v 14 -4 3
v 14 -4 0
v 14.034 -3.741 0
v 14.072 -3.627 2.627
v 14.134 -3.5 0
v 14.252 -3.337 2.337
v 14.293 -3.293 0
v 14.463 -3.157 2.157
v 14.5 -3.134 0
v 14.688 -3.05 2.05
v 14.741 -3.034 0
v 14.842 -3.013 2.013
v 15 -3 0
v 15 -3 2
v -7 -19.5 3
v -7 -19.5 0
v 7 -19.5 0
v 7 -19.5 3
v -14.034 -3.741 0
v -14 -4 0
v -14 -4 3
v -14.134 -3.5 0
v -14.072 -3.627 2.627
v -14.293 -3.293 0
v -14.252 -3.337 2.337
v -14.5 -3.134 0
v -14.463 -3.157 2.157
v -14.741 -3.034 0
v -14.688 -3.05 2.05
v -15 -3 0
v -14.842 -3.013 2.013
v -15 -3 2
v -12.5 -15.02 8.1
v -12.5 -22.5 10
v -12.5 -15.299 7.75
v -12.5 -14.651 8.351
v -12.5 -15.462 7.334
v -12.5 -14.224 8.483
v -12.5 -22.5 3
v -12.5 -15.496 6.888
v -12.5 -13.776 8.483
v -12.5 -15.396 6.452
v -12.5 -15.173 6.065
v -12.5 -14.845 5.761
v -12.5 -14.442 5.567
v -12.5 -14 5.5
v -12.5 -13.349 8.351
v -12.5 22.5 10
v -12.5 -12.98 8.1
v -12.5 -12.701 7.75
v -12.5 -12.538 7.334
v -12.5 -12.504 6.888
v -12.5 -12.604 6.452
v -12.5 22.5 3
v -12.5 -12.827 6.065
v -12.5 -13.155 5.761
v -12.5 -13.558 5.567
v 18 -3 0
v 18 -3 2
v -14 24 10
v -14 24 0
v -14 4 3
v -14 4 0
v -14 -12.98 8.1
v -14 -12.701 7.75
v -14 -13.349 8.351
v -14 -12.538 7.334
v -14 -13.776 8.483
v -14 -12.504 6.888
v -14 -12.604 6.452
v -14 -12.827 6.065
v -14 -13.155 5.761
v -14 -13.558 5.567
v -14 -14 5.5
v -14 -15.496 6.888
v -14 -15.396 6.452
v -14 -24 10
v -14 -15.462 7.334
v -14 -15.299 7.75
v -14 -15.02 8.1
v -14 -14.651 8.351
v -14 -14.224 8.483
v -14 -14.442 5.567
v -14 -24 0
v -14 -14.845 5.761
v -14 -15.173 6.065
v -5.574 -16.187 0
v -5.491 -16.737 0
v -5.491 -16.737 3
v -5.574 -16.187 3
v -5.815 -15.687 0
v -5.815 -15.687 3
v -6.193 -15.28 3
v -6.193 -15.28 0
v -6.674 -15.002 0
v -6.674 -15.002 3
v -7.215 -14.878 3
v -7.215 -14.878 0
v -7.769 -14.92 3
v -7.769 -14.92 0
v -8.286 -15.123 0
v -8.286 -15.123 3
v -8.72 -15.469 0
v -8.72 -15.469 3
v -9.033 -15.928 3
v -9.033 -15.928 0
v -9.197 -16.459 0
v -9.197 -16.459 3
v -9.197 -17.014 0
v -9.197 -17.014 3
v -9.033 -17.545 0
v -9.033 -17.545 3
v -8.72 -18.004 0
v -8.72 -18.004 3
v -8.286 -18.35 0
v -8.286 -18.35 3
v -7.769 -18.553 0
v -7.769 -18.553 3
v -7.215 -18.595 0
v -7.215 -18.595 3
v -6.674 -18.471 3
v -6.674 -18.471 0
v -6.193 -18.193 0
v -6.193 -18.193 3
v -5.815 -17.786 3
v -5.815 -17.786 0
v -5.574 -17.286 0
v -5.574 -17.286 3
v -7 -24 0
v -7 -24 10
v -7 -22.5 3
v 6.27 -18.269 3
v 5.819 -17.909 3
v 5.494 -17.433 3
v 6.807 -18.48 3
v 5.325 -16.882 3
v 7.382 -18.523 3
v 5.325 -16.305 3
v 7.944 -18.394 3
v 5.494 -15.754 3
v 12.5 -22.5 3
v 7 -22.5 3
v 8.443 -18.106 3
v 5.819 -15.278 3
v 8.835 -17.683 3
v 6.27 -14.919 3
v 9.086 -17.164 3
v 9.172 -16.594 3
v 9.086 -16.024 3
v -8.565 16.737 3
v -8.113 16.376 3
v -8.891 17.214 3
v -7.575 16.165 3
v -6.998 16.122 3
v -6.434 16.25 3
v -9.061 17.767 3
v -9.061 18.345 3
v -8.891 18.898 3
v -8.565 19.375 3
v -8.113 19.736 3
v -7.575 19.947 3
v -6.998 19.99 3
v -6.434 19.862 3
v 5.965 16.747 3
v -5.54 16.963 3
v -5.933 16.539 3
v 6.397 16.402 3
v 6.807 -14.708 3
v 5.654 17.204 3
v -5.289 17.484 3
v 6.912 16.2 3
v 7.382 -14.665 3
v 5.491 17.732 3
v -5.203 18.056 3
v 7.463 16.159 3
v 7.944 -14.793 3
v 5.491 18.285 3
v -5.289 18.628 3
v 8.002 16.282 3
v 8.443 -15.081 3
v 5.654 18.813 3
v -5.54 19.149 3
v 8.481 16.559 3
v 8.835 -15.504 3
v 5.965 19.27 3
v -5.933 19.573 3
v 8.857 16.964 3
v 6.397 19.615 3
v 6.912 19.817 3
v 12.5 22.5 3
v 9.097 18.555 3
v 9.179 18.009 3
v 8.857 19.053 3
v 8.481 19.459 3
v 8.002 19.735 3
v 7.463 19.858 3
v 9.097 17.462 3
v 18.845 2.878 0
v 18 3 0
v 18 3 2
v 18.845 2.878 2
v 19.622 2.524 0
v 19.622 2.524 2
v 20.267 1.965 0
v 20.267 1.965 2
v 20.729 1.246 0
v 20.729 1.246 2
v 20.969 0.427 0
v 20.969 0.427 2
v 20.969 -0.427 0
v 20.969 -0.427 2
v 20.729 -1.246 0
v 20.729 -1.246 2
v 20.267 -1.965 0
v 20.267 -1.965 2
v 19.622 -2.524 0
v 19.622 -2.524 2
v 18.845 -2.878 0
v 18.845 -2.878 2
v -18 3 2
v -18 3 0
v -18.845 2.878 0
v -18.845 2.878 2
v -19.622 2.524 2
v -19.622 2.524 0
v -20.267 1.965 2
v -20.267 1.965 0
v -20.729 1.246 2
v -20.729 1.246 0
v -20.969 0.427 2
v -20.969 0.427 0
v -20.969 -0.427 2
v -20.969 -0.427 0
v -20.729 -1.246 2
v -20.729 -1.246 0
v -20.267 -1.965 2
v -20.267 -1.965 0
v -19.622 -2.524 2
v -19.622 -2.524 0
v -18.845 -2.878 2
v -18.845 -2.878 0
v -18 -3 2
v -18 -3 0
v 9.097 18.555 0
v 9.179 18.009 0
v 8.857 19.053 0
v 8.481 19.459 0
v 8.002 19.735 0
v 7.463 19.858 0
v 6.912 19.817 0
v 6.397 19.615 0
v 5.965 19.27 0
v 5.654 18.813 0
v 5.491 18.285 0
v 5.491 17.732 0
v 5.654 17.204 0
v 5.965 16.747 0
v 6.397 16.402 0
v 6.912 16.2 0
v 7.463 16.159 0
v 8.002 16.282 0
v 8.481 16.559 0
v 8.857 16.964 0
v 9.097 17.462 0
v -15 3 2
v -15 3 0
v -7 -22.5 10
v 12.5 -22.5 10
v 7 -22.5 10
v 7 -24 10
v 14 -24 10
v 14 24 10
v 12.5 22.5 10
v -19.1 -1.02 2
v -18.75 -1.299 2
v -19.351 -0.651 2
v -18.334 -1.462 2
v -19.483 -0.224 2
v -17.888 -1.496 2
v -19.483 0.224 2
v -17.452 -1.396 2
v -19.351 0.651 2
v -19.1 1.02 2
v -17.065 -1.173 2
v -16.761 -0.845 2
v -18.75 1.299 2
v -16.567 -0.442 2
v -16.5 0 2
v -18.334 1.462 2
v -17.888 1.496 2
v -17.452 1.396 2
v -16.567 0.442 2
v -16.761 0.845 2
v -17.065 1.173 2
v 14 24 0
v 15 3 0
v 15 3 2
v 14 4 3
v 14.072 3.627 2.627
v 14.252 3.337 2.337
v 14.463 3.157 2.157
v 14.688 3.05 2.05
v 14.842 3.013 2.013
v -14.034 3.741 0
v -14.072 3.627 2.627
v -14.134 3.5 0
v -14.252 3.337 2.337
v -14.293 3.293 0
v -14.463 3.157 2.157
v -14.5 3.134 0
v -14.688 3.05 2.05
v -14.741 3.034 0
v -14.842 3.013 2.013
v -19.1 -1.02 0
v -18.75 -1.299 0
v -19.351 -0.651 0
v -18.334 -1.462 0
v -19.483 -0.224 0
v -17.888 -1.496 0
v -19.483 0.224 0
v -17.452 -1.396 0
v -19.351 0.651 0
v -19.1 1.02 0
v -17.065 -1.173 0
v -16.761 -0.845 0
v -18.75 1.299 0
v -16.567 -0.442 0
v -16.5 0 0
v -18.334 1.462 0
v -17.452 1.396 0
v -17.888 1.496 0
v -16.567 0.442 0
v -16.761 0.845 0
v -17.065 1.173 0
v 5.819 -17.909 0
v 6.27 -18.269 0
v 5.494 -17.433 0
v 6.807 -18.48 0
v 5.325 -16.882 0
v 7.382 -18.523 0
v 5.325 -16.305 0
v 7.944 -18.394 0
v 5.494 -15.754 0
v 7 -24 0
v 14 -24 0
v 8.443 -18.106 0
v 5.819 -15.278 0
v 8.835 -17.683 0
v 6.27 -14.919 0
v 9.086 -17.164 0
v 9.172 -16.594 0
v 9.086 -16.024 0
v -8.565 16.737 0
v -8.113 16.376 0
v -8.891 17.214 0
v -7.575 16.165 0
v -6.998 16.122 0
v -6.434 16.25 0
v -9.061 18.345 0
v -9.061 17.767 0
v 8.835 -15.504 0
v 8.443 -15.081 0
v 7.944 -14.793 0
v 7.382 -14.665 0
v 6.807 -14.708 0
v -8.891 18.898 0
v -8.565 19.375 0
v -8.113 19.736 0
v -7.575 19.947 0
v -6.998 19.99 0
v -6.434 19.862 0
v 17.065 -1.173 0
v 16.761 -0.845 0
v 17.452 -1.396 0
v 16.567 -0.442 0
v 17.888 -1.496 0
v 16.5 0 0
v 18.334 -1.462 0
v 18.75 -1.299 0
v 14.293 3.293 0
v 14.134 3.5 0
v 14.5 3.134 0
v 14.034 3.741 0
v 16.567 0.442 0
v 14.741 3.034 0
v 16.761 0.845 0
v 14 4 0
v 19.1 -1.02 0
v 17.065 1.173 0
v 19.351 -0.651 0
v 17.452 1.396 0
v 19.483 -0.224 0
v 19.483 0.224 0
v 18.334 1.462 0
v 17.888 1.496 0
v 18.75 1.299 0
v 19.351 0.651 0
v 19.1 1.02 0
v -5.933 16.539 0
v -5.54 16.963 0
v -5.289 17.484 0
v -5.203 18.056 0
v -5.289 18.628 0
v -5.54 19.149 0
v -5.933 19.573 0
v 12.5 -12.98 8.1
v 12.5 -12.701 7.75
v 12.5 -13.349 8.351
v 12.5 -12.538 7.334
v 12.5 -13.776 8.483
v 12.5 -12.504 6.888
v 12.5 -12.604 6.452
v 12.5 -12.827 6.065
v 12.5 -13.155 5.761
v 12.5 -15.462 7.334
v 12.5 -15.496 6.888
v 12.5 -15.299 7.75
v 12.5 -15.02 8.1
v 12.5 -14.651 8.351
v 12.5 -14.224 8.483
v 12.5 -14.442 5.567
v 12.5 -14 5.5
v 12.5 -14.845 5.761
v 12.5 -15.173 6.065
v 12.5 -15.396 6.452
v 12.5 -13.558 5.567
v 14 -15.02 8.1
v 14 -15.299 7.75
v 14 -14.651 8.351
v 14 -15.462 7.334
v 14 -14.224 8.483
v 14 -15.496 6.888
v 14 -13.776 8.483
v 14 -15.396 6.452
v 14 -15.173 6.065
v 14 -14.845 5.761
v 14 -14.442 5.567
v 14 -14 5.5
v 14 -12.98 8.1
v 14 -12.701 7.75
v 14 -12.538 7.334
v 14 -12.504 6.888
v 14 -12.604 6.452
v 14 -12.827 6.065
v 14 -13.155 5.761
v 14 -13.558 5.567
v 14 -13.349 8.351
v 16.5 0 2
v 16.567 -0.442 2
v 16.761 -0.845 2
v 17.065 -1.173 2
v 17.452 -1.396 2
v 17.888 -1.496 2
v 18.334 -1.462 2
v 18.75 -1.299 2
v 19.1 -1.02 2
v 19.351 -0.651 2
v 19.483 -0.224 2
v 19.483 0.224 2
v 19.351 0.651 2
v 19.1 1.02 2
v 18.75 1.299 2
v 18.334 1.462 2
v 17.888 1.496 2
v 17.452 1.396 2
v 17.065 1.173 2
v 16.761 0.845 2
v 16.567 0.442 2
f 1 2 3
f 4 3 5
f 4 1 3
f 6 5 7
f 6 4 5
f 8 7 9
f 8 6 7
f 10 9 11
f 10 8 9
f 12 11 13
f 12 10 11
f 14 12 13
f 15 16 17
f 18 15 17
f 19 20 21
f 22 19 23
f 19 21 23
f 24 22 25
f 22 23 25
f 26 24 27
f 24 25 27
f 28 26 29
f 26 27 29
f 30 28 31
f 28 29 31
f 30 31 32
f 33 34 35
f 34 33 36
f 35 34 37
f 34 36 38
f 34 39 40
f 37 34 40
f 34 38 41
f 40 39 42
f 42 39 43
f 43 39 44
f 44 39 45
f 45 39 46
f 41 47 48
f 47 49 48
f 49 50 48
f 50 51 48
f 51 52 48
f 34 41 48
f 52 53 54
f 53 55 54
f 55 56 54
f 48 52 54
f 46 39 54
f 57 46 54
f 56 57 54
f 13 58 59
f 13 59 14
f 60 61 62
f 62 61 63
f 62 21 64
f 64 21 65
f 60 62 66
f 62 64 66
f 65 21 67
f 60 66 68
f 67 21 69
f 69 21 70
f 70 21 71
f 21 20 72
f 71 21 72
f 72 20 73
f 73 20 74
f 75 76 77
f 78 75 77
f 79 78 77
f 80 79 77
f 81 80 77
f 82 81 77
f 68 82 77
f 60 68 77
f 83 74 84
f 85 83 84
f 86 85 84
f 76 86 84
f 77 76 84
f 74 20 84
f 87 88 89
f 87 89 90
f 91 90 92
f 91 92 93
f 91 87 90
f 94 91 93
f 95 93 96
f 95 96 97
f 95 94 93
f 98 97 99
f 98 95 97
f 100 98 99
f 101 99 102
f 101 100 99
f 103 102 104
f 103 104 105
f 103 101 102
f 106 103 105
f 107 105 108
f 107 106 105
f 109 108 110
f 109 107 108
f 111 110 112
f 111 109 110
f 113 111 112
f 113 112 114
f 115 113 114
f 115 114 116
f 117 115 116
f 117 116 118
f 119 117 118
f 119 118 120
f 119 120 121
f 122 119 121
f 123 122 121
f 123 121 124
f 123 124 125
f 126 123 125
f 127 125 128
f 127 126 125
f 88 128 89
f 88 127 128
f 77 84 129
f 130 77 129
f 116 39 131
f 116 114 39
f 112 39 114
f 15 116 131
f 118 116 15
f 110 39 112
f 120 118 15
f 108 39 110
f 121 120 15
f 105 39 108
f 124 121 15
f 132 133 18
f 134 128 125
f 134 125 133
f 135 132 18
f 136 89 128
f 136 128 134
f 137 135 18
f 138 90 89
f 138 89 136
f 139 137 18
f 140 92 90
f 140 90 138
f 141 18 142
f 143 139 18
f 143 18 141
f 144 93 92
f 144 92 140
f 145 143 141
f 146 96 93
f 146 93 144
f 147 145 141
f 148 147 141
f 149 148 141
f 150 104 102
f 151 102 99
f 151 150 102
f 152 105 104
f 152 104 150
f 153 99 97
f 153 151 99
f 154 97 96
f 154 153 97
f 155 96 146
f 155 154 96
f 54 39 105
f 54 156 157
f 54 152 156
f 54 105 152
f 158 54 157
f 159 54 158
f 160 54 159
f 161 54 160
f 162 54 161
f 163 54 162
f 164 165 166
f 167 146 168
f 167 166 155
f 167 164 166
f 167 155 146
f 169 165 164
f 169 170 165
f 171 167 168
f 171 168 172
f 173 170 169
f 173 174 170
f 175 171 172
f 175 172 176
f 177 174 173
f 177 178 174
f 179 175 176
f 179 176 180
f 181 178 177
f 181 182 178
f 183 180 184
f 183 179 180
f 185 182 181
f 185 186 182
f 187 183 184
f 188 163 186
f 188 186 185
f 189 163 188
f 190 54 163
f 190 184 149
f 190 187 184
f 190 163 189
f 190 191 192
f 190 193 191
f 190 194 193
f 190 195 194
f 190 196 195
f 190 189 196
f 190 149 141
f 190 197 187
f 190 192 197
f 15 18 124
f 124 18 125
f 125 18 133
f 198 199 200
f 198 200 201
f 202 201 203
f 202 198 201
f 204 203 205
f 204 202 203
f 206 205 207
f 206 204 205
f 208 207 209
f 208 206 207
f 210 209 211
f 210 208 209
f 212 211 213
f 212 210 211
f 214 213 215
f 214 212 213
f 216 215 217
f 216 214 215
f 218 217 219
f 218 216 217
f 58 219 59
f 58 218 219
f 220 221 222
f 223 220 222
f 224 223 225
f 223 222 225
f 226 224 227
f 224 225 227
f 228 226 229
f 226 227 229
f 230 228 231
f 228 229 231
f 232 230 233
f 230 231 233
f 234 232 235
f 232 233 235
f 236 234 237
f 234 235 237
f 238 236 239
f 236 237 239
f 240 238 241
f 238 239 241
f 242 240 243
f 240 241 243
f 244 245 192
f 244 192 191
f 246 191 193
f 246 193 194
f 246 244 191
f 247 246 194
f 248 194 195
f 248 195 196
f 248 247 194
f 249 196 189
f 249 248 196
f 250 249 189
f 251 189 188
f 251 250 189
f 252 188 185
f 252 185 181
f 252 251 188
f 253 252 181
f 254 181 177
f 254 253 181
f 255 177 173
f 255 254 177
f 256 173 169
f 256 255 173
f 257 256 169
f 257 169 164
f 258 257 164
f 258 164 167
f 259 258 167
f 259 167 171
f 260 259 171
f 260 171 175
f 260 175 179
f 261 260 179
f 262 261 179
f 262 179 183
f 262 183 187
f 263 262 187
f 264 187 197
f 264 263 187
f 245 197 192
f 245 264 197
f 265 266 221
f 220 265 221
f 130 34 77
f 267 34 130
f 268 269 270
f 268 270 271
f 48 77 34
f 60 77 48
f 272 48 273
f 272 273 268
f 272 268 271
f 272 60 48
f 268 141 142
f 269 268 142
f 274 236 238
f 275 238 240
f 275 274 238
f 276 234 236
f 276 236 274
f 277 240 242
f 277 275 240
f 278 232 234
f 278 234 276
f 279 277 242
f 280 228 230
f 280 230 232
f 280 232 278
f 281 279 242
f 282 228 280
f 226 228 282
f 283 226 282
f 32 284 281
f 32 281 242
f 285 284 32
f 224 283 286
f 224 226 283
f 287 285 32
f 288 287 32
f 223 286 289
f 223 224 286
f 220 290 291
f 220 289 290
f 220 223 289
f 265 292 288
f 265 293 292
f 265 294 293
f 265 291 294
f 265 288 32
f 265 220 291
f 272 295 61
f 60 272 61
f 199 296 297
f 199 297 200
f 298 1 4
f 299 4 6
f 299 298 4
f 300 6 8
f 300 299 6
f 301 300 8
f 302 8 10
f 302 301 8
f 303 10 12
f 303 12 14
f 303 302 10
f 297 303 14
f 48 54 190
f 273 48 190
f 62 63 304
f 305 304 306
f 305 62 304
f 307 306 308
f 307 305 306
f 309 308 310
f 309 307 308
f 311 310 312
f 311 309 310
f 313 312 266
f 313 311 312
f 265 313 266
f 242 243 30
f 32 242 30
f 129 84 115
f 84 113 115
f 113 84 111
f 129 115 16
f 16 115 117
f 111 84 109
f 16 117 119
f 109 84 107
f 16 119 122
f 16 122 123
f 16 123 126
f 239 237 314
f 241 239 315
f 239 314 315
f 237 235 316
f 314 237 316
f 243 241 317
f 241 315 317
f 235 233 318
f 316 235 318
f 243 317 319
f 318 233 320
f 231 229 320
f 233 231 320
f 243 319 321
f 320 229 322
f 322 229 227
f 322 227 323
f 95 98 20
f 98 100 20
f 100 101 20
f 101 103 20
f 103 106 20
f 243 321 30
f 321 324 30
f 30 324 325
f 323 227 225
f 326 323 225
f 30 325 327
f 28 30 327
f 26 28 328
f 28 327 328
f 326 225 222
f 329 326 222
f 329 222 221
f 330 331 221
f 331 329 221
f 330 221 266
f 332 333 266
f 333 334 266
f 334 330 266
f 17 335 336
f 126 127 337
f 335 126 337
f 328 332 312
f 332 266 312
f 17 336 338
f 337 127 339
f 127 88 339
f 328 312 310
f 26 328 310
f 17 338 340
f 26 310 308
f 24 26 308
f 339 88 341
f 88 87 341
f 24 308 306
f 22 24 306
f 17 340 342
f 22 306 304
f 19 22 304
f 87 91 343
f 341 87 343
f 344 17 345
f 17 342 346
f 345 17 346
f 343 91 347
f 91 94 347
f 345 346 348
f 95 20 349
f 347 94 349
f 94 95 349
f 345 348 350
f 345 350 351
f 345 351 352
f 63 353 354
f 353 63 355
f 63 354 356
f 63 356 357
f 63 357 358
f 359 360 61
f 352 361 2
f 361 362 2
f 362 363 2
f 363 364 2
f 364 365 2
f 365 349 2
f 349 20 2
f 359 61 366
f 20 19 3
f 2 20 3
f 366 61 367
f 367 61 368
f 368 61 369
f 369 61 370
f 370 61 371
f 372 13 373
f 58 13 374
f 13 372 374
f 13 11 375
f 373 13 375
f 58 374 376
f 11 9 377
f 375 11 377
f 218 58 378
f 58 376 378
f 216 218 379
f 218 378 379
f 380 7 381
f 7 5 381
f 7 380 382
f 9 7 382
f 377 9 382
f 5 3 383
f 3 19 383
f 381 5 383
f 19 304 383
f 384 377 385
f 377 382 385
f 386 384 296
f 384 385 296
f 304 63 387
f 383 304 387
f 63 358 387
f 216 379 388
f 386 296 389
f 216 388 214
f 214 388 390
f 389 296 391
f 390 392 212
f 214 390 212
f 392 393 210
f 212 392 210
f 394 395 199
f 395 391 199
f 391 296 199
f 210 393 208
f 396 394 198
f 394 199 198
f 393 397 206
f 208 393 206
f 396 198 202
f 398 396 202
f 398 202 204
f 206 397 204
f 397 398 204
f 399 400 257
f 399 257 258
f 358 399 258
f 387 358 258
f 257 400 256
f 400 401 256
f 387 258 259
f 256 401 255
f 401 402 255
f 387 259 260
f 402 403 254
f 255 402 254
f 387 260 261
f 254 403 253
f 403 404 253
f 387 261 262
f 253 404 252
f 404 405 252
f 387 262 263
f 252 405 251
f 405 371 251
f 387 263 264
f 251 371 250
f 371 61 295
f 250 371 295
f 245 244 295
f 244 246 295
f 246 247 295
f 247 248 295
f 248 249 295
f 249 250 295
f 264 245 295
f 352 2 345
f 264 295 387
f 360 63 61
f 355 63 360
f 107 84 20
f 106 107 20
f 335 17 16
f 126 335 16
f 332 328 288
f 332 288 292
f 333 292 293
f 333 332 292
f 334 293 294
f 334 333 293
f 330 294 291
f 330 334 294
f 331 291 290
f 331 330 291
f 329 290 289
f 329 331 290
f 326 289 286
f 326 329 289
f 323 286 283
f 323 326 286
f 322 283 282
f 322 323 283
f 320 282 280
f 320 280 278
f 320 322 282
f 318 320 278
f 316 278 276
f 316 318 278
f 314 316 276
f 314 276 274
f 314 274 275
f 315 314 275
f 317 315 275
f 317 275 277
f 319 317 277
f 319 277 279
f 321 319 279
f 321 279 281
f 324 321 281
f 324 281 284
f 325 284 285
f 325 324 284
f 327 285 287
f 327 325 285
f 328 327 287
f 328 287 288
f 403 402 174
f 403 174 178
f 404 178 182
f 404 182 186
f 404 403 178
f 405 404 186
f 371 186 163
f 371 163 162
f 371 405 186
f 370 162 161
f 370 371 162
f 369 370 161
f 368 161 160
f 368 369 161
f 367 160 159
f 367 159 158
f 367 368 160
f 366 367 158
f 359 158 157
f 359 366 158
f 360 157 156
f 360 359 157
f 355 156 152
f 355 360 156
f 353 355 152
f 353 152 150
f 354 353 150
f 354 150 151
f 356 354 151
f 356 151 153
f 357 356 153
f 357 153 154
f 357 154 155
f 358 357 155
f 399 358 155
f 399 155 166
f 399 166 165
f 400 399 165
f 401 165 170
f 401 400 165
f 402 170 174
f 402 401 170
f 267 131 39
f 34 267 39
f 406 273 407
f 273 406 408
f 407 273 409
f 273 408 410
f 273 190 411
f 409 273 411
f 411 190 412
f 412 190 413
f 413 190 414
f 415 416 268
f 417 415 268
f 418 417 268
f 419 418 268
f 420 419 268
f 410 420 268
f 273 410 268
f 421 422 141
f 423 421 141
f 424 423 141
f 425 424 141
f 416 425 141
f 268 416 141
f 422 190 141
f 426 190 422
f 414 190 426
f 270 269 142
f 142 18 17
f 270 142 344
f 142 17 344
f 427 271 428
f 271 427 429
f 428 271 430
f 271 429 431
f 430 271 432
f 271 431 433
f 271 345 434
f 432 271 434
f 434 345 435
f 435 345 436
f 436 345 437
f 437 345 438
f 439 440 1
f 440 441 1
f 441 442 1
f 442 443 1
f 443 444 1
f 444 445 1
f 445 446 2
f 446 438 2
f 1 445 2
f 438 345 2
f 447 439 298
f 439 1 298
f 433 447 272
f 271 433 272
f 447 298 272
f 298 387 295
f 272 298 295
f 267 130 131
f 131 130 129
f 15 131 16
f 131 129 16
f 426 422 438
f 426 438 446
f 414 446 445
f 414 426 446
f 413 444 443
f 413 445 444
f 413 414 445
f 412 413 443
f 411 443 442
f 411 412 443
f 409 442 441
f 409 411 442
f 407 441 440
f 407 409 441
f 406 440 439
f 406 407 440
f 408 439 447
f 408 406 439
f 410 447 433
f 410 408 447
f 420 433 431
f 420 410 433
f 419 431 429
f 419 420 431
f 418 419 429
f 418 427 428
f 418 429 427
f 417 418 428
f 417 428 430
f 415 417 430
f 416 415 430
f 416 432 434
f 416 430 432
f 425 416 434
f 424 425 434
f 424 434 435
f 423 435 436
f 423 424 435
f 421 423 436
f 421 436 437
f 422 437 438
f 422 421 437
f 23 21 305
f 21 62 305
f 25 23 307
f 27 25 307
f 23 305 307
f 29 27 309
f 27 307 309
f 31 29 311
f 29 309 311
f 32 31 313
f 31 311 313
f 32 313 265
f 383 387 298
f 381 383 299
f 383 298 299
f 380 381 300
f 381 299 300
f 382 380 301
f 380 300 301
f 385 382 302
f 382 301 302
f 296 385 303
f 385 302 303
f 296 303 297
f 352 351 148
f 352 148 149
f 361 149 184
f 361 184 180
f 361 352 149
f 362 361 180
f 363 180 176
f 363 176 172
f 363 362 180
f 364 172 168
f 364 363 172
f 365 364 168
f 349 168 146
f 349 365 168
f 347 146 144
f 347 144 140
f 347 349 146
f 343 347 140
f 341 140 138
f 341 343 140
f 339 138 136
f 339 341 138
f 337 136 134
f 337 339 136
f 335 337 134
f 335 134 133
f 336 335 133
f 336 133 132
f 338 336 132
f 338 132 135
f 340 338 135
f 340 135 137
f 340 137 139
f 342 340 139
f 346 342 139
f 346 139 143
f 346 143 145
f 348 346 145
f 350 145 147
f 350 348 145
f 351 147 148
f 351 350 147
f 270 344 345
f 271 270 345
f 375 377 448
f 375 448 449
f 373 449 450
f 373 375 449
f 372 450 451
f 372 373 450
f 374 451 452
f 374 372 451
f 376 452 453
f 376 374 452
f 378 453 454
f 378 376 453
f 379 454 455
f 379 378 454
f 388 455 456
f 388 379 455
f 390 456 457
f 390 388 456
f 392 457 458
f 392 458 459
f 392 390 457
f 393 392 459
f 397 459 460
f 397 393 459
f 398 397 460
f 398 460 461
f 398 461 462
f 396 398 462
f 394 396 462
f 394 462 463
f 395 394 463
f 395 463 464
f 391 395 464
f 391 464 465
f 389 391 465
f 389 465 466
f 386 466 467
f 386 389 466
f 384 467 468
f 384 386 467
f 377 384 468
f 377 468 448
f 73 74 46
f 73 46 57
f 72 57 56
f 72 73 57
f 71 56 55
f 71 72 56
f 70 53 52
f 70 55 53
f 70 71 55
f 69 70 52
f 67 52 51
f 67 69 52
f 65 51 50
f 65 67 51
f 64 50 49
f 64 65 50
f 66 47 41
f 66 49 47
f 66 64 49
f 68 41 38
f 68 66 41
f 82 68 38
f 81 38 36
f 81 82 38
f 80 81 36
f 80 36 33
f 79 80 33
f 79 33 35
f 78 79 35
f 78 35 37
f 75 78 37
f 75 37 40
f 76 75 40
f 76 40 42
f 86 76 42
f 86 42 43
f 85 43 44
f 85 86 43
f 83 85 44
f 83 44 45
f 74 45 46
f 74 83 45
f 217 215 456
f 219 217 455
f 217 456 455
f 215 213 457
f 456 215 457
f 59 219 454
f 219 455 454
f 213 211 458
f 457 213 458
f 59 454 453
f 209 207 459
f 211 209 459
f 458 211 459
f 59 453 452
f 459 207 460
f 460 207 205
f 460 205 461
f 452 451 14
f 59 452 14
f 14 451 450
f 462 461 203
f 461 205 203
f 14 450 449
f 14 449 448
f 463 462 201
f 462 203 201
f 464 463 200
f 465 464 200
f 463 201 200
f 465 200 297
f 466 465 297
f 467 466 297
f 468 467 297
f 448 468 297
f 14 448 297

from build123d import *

# Parameters (mm, degrees)
ESQUISSE1_W                  = 25
ESQUISSE1_H                  = 45
ESQUISSE1_R                  = 1.863501178
ESQUISSE1_R_2                = 1.93430269
ESQUISSE1_R_3                = 1.939737899
ESQUISSE1_R_4                = 1.854627201
BOSS_EXTRU_1_DEPTH           = 3
BOSS_EXTRU_2_DEPTH           = 10
ENL_V_MAT_EXTRU_1_DEPTH      = 30.52964612
ENL_V_MAT_EXTRU_1_DEPTH_BACK = 30.52964612
ESQUISSE3_R                  = 1.5
ESQUISSE4_R                  = 1.5
BOSS_EXTRU_3_DEPTH           = 2
CONG_1_R                     = 1
ESQUISSE5_W                  = 14
ESQUISSE5_H                  = 3
ENL_V_MAT_EXTRU_2_DEPTH      = 34.421549934


with BuildPart() as part:
    # Esquisse1 → Boss.-Extru.1 (new body)
    with BuildSketch(Plane.XY):
        Rectangle(ESQUISSE1_W, ESQUISSE1_H)
        with Locations((-7.354431697, -16.736502833)):
            Circle(ESQUISSE1_R, mode=Mode.SUBTRACT)
        with Locations((7.237211302, -16.593743463)):
            Circle(ESQUISSE1_R_2, mode=Mode.SUBTRACT)
        with Locations((-7.142905367, 18.055953642)):
            Circle(ESQUISSE1_R_3, mode=Mode.SUBTRACT)
        with Locations((7.324743745, 18.008545284)):
            Circle(ESQUISSE1_R_4, mode=Mode.SUBTRACT)
    extrude(amount=BOSS_EXTRU_1_DEPTH)

    # Esquisse2 → Boss.-Extru.2 (add)
    with BuildSketch(Plane.XY):
        Polygon((7, -22.5), (7, -24), (14, -24), (14, 24), (-14, 24), (-14, -24), (-7, -24), (-7, -22.5), (-12.5, -22.5), (-12.5, 22.5), (12.5, 22.5), (12.5, -22.5), align=None)
    extrude(amount=BOSS_EXTRU_2_DEPTH)

    # Esquisse3 → Enlèv. mat.-Extru.1 (cut, two sides: drawn at the far end of the back side and taken through both)
    with BuildSketch(Plane(origin=(0, 0, 0), x_dir=(0, 0, -1), z_dir=(1, 0, 0)).offset(-ENL_V_MAT_EXTRU_1_DEPTH_BACK)):
        with Locations((-7, -14)):
            Circle(ESQUISSE3_R)
    extrude(amount=ENL_V_MAT_EXTRU_1_DEPTH + ENL_V_MAT_EXTRU_1_DEPTH_BACK, mode=Mode.SUBTRACT)

    # Esquisse4 → Boss.-Extru.3 (add)
    # profile 1 of 2: a face of its own
    with BuildSketch(Plane.XY):
        with BuildLine():
            Line((-14, 3), (-18, 3))
            ThreePointArc((-18, 3), (-21, 0), (-18, -3))
            Line((-18, -3), (-14, -3))
            Line((-14, -3), (-14, 3))
        make_face()
        with Locations((-18, 0)):
            Circle(ESQUISSE4_R, mode=Mode.SUBTRACT)
    # profile 2 of 2: a face of its own
    with BuildSketch(Plane.XY):
        with BuildLine():
            Line((18, -3), (14, -3))
            Line((14, -3), (14, 3))
            Line((14, 3), (18, 3))
            ThreePointArc((18, 3), (21, 0), (18, -3))
        make_face()
        with Locations(Location((18, 0, 0), (0, 0, 180))):
            Circle(ESQUISSE4_R, mode=Mode.SUBTRACT)
    extrude(amount=BOSS_EXTRU_3_DEPTH)

    # Congé1
    cong_1_edges = [part.edges().sort_by_distance(p)[0] for p in [
        (-14, 0, 2),
        (-14, -3, 1),
        (-14, 3, 1),
        (14, 0, 2),
        (14, 3, 1),
        (14, -3, 1),
    ]]
    fillet(cong_1_edges, radius=CONG_1_R)

    # Esquisse5 → Enlèv. mat.-Extru.2 (cut, through all)
    with BuildSketch(Plane.XY):
        with Locations((0, -21)):
            Rectangle(ESQUISSE5_W, ESQUISSE5_H)
    extrude(amount=ENL_V_MAT_EXTRU_2_DEPTH, mode=Mode.SUBTRACT)


solid = part.part
